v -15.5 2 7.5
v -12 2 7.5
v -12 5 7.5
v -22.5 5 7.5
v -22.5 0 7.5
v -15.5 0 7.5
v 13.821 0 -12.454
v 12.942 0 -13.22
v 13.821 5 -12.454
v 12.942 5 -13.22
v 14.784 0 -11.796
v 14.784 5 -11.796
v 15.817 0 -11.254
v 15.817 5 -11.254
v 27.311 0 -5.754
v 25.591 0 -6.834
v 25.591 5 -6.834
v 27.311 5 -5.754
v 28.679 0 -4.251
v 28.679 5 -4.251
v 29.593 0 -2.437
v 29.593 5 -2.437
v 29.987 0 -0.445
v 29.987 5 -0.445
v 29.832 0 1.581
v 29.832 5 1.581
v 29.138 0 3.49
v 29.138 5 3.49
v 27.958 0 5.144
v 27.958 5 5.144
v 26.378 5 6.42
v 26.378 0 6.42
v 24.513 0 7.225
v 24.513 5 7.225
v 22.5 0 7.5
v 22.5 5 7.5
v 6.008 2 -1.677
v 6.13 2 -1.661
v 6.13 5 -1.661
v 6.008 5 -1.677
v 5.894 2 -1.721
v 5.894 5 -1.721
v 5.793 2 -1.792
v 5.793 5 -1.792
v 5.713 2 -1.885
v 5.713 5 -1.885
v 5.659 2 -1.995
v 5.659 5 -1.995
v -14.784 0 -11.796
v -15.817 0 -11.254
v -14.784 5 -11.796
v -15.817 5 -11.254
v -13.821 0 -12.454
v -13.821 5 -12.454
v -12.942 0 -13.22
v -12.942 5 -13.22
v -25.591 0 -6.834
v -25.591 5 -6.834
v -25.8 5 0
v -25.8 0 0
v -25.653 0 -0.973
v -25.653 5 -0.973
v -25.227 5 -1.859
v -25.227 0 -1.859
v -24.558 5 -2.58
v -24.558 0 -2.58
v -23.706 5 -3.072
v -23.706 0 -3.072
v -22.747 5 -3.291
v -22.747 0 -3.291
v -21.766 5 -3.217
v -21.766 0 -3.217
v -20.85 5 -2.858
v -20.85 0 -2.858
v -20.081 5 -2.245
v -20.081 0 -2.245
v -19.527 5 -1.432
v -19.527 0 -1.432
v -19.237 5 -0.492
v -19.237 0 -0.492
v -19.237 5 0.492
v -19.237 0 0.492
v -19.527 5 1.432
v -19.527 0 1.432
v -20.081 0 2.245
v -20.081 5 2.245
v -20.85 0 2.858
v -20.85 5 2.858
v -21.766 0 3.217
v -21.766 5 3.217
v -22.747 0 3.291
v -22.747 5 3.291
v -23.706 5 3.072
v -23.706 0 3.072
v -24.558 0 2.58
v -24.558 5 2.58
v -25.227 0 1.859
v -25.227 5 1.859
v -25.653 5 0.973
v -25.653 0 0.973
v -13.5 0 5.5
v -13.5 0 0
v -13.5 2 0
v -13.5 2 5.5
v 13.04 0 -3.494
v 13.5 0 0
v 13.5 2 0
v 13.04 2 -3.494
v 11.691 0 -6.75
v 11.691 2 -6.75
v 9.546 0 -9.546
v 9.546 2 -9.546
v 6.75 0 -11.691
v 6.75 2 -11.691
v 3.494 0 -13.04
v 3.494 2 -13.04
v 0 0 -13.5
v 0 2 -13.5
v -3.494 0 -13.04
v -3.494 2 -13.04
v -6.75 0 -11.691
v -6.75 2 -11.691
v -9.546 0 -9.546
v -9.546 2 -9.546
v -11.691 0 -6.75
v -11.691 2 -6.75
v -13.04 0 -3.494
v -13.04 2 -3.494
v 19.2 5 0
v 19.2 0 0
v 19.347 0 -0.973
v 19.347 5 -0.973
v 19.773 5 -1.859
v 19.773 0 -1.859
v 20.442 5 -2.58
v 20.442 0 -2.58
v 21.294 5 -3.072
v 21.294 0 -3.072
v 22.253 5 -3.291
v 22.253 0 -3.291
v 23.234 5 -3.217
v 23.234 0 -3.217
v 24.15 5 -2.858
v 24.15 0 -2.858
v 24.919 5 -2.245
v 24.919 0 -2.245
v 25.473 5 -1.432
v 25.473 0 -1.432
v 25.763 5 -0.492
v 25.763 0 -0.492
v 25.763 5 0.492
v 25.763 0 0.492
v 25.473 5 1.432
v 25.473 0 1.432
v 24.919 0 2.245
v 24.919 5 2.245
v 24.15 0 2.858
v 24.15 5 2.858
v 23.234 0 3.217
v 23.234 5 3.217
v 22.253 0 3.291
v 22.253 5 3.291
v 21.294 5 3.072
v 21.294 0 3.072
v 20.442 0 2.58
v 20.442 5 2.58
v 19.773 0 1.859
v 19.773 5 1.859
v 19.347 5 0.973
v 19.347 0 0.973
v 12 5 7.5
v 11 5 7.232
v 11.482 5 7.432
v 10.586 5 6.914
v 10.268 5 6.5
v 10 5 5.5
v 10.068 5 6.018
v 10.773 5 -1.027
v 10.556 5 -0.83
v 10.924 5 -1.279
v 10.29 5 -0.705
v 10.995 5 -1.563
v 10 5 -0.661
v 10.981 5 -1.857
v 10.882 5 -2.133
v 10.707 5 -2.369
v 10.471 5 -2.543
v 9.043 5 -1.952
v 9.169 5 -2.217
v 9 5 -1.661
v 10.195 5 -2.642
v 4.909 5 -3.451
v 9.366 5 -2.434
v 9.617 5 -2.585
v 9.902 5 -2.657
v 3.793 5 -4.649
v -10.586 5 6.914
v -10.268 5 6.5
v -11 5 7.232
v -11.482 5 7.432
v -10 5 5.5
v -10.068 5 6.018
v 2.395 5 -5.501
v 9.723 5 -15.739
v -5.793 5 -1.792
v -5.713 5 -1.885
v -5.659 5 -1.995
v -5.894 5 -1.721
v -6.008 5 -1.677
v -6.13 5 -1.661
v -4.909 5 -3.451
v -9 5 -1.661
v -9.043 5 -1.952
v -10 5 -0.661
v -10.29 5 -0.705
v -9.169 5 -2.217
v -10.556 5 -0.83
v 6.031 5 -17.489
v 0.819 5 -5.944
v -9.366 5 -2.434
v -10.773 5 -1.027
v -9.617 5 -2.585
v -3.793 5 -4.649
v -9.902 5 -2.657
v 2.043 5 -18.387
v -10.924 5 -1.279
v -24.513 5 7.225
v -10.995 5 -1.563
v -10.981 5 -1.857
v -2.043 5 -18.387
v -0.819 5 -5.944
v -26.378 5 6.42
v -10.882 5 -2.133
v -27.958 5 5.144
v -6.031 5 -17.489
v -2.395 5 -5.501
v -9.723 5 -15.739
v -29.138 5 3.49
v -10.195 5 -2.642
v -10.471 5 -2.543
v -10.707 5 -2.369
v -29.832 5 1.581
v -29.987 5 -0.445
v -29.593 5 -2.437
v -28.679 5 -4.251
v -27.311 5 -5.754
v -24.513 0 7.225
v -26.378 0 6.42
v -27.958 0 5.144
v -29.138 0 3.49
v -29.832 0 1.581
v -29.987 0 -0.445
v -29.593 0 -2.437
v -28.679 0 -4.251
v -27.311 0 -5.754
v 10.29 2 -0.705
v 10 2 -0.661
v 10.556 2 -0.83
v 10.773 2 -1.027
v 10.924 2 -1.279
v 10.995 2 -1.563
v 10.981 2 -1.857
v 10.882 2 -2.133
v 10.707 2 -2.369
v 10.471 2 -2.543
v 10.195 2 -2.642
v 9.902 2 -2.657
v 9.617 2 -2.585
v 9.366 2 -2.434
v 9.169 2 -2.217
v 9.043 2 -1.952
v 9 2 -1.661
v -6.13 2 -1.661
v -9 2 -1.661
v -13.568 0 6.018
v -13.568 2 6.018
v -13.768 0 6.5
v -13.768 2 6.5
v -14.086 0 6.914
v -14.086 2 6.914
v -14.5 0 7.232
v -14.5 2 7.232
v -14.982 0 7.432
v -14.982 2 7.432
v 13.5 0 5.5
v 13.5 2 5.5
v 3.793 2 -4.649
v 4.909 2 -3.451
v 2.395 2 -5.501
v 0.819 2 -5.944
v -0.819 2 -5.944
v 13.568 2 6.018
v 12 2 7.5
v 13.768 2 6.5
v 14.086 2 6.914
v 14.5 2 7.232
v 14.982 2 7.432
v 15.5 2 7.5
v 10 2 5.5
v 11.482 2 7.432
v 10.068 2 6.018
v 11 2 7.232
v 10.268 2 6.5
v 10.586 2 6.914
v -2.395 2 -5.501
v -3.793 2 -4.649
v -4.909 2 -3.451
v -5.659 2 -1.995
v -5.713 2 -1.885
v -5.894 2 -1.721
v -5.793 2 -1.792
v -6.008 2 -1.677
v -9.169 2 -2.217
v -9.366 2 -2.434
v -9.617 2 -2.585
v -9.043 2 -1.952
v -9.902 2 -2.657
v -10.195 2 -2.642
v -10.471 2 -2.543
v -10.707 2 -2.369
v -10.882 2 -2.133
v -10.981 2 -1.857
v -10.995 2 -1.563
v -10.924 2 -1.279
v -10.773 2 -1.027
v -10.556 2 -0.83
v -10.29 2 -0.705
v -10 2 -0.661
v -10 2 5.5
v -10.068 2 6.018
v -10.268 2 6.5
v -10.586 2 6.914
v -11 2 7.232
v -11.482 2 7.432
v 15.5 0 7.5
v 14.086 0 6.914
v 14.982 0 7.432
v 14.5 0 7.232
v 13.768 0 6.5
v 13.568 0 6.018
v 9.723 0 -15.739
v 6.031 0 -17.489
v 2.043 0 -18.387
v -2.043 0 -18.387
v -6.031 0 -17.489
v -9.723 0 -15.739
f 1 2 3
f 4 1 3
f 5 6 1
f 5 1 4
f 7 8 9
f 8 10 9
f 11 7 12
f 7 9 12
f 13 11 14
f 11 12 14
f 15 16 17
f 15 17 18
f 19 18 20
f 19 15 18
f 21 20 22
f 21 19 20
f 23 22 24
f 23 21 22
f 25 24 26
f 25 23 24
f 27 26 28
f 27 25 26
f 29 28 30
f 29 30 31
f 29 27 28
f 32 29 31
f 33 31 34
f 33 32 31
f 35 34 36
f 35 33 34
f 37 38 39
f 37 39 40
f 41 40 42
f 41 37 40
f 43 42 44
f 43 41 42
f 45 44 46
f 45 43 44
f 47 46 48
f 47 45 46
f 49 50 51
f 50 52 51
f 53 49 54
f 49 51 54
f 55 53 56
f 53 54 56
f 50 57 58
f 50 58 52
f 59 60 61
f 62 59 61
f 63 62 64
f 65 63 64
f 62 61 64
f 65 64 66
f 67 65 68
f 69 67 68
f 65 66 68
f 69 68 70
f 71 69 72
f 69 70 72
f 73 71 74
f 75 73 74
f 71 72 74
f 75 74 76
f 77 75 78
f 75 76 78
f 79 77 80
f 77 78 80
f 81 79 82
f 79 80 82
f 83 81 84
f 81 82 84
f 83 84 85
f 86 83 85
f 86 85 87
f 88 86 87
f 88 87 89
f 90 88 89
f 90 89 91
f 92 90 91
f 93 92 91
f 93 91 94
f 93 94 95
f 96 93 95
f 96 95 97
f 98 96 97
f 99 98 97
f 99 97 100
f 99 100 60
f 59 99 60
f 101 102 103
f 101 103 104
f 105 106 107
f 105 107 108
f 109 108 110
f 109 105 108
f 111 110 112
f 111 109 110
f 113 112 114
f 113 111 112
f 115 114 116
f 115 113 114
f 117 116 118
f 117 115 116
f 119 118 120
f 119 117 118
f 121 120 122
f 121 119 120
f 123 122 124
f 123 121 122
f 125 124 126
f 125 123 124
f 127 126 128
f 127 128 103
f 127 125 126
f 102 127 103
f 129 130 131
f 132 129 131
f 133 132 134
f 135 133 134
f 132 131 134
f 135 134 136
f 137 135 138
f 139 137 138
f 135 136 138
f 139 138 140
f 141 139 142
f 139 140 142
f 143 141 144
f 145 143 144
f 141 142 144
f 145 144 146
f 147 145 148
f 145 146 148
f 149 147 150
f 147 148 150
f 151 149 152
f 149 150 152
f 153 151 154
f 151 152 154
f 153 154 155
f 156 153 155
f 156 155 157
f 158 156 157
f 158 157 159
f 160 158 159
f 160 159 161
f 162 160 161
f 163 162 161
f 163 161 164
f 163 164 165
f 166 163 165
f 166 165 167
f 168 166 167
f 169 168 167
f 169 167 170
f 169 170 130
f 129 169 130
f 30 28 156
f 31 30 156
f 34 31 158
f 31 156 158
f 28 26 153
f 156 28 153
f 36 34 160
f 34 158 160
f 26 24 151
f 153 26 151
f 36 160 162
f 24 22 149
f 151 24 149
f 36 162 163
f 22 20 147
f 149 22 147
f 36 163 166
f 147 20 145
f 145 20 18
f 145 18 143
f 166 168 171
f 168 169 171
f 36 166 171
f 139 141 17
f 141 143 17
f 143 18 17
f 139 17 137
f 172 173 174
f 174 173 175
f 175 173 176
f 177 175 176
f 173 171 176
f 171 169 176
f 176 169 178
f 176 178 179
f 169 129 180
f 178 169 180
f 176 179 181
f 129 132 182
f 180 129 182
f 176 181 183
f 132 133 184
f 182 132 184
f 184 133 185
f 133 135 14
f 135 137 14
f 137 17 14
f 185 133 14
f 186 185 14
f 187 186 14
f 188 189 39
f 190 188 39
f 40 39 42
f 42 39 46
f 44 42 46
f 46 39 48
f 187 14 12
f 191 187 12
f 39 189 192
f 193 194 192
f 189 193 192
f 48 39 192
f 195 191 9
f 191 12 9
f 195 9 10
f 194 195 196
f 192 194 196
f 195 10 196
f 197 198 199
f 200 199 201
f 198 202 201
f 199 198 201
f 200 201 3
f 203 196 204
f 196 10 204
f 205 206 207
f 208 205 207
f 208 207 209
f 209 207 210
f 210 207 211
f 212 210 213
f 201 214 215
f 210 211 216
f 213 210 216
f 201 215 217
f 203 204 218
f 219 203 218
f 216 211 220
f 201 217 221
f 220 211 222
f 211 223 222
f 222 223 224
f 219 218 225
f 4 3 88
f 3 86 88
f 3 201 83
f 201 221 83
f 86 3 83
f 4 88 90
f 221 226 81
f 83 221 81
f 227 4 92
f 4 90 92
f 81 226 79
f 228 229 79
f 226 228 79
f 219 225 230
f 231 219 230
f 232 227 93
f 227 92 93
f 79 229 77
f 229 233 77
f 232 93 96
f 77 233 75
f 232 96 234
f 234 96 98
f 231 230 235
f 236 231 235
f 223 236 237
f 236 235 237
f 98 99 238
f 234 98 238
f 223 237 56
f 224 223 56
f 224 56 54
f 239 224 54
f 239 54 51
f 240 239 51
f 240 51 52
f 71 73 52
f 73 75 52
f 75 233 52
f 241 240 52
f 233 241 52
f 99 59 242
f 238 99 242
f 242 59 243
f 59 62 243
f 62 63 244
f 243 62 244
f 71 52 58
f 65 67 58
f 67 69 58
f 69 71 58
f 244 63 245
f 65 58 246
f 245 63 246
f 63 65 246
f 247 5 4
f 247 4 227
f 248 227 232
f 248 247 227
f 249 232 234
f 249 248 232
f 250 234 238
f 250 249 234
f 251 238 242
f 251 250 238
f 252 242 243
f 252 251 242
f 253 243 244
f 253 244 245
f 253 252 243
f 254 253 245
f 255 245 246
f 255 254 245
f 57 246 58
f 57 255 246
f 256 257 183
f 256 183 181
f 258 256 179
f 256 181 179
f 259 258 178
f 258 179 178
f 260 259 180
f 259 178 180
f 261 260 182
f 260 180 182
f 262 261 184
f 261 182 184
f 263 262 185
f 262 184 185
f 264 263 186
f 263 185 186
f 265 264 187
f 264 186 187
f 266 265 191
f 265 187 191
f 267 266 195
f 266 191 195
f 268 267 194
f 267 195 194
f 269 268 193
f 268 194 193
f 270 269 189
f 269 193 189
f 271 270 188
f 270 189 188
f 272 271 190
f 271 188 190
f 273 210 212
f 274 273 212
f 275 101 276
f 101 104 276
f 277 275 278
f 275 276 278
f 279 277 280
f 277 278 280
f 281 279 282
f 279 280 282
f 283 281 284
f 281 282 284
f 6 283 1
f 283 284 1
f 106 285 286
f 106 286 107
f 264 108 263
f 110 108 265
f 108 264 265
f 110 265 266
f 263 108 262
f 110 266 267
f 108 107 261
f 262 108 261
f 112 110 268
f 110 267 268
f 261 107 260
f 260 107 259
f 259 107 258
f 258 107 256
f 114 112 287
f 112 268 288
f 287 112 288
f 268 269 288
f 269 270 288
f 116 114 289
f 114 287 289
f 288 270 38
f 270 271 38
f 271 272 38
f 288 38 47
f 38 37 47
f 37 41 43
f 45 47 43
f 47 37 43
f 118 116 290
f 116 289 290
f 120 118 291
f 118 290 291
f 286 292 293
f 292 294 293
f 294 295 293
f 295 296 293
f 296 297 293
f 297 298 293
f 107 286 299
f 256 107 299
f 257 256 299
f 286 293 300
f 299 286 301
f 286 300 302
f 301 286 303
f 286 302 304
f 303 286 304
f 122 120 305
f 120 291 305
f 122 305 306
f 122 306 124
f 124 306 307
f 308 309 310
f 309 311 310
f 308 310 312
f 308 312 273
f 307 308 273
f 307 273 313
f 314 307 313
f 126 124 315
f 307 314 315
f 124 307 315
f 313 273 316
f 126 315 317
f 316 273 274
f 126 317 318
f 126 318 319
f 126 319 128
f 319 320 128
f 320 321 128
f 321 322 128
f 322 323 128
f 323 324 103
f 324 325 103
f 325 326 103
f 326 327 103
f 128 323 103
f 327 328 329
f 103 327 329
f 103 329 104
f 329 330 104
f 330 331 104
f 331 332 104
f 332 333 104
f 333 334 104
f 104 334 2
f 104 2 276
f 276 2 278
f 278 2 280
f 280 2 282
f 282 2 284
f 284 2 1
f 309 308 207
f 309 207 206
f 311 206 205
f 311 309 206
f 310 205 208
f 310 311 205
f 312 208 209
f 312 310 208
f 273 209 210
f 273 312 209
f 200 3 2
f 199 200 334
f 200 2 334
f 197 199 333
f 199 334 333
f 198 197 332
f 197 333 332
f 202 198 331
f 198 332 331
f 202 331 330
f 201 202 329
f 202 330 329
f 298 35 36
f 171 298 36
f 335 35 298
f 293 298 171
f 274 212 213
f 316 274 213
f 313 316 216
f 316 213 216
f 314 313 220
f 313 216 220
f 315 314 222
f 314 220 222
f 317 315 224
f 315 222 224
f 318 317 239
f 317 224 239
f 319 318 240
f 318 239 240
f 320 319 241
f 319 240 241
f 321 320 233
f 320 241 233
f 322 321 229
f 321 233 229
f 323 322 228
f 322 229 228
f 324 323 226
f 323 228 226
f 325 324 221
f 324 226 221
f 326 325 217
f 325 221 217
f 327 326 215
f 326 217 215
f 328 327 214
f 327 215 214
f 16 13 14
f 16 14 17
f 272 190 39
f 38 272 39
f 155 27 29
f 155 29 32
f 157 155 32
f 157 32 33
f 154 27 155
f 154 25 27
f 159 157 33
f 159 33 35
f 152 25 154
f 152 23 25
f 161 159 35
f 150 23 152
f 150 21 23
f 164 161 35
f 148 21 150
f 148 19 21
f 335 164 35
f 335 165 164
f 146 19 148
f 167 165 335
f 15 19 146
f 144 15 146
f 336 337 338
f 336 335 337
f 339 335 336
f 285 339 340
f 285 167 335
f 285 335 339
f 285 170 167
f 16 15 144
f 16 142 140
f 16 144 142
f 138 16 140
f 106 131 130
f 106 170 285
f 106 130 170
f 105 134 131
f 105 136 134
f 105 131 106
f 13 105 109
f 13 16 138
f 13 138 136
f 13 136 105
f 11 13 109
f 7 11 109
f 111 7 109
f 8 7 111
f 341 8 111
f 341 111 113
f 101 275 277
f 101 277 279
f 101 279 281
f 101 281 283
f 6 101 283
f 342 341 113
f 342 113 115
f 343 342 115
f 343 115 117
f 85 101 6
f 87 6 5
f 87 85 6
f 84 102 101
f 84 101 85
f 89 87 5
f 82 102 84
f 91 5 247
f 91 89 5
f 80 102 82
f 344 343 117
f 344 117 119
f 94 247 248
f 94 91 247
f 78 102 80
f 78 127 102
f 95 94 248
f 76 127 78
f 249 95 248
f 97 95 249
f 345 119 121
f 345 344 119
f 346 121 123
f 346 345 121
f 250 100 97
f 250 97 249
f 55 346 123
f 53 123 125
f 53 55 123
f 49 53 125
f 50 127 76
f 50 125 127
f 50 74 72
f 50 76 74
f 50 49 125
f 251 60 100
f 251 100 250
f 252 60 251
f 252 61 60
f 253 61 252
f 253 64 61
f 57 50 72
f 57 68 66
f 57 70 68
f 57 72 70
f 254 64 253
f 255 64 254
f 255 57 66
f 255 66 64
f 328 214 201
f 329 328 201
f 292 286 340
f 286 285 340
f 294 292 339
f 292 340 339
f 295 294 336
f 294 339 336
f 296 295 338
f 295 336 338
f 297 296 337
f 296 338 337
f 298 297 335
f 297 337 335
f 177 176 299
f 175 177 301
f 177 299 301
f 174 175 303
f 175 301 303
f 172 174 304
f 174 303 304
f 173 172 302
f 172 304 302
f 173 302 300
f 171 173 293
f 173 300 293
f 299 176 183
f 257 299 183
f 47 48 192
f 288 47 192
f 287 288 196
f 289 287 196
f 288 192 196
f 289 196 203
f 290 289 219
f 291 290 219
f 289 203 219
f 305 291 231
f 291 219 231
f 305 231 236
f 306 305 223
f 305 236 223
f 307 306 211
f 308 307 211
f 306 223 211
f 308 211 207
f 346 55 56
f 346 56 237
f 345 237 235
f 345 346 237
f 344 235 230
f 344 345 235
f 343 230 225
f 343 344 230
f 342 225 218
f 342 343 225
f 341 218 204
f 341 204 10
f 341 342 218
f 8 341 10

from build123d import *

# Parameters (mm, degrees)
BOSS_EXTRUDE1_DEPTH  = 5
CUT_EXTRUDE1_DEPTH   = 6
FILLET1_R            = 10
M6_CLEARANCE_HOLE1_D = 6.6
FILLET2_R            = 0.5
SKETCH5_R            = 1
CUT_EXTRUDE2_DEPTH   = 6
FILLET3_R            = 2
CUT_EXTRUDE3_DEPTH   = 2
FILLET4_R            = 2


with BuildPart() as part:
    # Sketch1 → Boss-Extrude1 (new body)
    with BuildSketch(Plane(origin=(0, 0, 0), x_dir=(1, 0, 0), z_dir=(0, 1, 0))):
        with BuildLine():
            Line((-25.590540252, 6.833634535), (-14.025260906, 12.064081255))
            ThreePointArc((-14.025260906, 12.064081255), (0, 18.5), (14.025260906, 12.064081255))
            Line((14.025260906, 12.064081255), (25.590540252, 6.833634535))
            ThreePointArc((25.590540252, 6.833634535), (29.83151618, -1.580781609), (22.5, -7.5))
            Line((22.5, -7.5), (-22.5, -7.5))
            ThreePointArc((-22.5, -7.5), (-29.83151618, -1.580781609), (-25.590540252, 6.833634535))
        make_face()
    extrude(amount=BOSS_EXTRUDE1_DEPTH)

    # Sketch2 → Cut-Extrude1 (cut, through all)
    with BuildSketch(Plane(origin=(0, 5, 0), x_dir=(1, 0, 0), z_dir=(0, 1, 0))):
        with BuildLine():
            Line((10, -7.5), (10, 1.661480829))
            Line((10, 1.661480829), (5.765369152, 1.661480829))
            ThreePointArc((5.765369152, 1.661480829), (0, 6), (-5.765369152, 1.661480829))
            Line((-5.765369152, 1.661480829), (-10, 1.661480829))
            Line((-10, 1.661480829), (-10, -7.5))
            Line((-10, -7.5), (10, -7.5))
        make_face()
    extrude(amount=-CUT_EXTRUDE1_DEPTH, mode=Mode.SUBTRACT)

    # Fillet1
    fillet1_edges = [part.edges().sort_by_distance(p)[0] for p in [
        (-14.025260906, 2.5, -12.064081255),
        (14.025260906, 2.5, -12.064081255),
    ]]
    fillet(fillet1_edges, radius=FILLET1_R)

    # M6 Clearance Hole1 (through all)
    with Locations(Plane(origin=(0, 5, 0), x_dir=(1, 0, 0), z_dir=(0, 1, 0))):
        with Locations((-22.5, 0), (22.5, 0)):
            Hole(M6_CLEARANCE_HOLE1_D / 2)

    # Fillet2
    fillet2_edges = [part.edges().sort_by_distance(p)[0] for p in [
        (-5.765369152, 2.5, -1.661480829),
        (5.765369152, 2.5, -1.661480829),
    ]]
    fillet(fillet2_edges, radius=FILLET2_R)

    # Sketch5 → Cut-Extrude2 (cut, through all)
    with BuildSketch(Plane(origin=(0, 5, 0), x_dir=(1, 0, 0), z_dir=(0, 1, 0))):
        with Locations((-10, 1.661480829)):
            Circle(SKETCH5_R)
        with Locations((10, 1.661480829)):
            Circle(SKETCH5_R)
    extrude(amount=-CUT_EXTRUDE2_DEPTH, mode=Mode.SUBTRACT)

    # Fillet3
    fillet3_edges = [part.edges().sort_by_distance(p)[0] for p in [
        (10, 2.5, 7.5),
        (-10, 2.5, 7.5),
    ]]
    fillet(fillet3_edges, radius=FILLET3_R)

    # Sketch6 → Cut-Extrude3 (cut)
    with BuildSketch(Plane.XZ):
        with BuildLine():
            Line((-13.5, 0), (-13.5, 12))
            ThreePointArc((-13.5, 12), (0, 25.5), (13.5, 12))
            Line((13.5, 12), (13.5, 0))
            ThreePointArc((13.5, 0), (0, -13.5), (-13.5, 0))
        make_face()
    extrude(amount=-CUT_EXTRUDE3_DEPTH, mode=Mode.SUBTRACT)

    # Fillet4
    fillet4_edges = [part.edges().sort_by_distance(p)[0] for p in [
        (-13.5, 1, 7.5),
        (13.5, 1, 7.5),
    ]]
    fillet(fillet4_edges, radius=FILLET4_R)


solid = part.part
